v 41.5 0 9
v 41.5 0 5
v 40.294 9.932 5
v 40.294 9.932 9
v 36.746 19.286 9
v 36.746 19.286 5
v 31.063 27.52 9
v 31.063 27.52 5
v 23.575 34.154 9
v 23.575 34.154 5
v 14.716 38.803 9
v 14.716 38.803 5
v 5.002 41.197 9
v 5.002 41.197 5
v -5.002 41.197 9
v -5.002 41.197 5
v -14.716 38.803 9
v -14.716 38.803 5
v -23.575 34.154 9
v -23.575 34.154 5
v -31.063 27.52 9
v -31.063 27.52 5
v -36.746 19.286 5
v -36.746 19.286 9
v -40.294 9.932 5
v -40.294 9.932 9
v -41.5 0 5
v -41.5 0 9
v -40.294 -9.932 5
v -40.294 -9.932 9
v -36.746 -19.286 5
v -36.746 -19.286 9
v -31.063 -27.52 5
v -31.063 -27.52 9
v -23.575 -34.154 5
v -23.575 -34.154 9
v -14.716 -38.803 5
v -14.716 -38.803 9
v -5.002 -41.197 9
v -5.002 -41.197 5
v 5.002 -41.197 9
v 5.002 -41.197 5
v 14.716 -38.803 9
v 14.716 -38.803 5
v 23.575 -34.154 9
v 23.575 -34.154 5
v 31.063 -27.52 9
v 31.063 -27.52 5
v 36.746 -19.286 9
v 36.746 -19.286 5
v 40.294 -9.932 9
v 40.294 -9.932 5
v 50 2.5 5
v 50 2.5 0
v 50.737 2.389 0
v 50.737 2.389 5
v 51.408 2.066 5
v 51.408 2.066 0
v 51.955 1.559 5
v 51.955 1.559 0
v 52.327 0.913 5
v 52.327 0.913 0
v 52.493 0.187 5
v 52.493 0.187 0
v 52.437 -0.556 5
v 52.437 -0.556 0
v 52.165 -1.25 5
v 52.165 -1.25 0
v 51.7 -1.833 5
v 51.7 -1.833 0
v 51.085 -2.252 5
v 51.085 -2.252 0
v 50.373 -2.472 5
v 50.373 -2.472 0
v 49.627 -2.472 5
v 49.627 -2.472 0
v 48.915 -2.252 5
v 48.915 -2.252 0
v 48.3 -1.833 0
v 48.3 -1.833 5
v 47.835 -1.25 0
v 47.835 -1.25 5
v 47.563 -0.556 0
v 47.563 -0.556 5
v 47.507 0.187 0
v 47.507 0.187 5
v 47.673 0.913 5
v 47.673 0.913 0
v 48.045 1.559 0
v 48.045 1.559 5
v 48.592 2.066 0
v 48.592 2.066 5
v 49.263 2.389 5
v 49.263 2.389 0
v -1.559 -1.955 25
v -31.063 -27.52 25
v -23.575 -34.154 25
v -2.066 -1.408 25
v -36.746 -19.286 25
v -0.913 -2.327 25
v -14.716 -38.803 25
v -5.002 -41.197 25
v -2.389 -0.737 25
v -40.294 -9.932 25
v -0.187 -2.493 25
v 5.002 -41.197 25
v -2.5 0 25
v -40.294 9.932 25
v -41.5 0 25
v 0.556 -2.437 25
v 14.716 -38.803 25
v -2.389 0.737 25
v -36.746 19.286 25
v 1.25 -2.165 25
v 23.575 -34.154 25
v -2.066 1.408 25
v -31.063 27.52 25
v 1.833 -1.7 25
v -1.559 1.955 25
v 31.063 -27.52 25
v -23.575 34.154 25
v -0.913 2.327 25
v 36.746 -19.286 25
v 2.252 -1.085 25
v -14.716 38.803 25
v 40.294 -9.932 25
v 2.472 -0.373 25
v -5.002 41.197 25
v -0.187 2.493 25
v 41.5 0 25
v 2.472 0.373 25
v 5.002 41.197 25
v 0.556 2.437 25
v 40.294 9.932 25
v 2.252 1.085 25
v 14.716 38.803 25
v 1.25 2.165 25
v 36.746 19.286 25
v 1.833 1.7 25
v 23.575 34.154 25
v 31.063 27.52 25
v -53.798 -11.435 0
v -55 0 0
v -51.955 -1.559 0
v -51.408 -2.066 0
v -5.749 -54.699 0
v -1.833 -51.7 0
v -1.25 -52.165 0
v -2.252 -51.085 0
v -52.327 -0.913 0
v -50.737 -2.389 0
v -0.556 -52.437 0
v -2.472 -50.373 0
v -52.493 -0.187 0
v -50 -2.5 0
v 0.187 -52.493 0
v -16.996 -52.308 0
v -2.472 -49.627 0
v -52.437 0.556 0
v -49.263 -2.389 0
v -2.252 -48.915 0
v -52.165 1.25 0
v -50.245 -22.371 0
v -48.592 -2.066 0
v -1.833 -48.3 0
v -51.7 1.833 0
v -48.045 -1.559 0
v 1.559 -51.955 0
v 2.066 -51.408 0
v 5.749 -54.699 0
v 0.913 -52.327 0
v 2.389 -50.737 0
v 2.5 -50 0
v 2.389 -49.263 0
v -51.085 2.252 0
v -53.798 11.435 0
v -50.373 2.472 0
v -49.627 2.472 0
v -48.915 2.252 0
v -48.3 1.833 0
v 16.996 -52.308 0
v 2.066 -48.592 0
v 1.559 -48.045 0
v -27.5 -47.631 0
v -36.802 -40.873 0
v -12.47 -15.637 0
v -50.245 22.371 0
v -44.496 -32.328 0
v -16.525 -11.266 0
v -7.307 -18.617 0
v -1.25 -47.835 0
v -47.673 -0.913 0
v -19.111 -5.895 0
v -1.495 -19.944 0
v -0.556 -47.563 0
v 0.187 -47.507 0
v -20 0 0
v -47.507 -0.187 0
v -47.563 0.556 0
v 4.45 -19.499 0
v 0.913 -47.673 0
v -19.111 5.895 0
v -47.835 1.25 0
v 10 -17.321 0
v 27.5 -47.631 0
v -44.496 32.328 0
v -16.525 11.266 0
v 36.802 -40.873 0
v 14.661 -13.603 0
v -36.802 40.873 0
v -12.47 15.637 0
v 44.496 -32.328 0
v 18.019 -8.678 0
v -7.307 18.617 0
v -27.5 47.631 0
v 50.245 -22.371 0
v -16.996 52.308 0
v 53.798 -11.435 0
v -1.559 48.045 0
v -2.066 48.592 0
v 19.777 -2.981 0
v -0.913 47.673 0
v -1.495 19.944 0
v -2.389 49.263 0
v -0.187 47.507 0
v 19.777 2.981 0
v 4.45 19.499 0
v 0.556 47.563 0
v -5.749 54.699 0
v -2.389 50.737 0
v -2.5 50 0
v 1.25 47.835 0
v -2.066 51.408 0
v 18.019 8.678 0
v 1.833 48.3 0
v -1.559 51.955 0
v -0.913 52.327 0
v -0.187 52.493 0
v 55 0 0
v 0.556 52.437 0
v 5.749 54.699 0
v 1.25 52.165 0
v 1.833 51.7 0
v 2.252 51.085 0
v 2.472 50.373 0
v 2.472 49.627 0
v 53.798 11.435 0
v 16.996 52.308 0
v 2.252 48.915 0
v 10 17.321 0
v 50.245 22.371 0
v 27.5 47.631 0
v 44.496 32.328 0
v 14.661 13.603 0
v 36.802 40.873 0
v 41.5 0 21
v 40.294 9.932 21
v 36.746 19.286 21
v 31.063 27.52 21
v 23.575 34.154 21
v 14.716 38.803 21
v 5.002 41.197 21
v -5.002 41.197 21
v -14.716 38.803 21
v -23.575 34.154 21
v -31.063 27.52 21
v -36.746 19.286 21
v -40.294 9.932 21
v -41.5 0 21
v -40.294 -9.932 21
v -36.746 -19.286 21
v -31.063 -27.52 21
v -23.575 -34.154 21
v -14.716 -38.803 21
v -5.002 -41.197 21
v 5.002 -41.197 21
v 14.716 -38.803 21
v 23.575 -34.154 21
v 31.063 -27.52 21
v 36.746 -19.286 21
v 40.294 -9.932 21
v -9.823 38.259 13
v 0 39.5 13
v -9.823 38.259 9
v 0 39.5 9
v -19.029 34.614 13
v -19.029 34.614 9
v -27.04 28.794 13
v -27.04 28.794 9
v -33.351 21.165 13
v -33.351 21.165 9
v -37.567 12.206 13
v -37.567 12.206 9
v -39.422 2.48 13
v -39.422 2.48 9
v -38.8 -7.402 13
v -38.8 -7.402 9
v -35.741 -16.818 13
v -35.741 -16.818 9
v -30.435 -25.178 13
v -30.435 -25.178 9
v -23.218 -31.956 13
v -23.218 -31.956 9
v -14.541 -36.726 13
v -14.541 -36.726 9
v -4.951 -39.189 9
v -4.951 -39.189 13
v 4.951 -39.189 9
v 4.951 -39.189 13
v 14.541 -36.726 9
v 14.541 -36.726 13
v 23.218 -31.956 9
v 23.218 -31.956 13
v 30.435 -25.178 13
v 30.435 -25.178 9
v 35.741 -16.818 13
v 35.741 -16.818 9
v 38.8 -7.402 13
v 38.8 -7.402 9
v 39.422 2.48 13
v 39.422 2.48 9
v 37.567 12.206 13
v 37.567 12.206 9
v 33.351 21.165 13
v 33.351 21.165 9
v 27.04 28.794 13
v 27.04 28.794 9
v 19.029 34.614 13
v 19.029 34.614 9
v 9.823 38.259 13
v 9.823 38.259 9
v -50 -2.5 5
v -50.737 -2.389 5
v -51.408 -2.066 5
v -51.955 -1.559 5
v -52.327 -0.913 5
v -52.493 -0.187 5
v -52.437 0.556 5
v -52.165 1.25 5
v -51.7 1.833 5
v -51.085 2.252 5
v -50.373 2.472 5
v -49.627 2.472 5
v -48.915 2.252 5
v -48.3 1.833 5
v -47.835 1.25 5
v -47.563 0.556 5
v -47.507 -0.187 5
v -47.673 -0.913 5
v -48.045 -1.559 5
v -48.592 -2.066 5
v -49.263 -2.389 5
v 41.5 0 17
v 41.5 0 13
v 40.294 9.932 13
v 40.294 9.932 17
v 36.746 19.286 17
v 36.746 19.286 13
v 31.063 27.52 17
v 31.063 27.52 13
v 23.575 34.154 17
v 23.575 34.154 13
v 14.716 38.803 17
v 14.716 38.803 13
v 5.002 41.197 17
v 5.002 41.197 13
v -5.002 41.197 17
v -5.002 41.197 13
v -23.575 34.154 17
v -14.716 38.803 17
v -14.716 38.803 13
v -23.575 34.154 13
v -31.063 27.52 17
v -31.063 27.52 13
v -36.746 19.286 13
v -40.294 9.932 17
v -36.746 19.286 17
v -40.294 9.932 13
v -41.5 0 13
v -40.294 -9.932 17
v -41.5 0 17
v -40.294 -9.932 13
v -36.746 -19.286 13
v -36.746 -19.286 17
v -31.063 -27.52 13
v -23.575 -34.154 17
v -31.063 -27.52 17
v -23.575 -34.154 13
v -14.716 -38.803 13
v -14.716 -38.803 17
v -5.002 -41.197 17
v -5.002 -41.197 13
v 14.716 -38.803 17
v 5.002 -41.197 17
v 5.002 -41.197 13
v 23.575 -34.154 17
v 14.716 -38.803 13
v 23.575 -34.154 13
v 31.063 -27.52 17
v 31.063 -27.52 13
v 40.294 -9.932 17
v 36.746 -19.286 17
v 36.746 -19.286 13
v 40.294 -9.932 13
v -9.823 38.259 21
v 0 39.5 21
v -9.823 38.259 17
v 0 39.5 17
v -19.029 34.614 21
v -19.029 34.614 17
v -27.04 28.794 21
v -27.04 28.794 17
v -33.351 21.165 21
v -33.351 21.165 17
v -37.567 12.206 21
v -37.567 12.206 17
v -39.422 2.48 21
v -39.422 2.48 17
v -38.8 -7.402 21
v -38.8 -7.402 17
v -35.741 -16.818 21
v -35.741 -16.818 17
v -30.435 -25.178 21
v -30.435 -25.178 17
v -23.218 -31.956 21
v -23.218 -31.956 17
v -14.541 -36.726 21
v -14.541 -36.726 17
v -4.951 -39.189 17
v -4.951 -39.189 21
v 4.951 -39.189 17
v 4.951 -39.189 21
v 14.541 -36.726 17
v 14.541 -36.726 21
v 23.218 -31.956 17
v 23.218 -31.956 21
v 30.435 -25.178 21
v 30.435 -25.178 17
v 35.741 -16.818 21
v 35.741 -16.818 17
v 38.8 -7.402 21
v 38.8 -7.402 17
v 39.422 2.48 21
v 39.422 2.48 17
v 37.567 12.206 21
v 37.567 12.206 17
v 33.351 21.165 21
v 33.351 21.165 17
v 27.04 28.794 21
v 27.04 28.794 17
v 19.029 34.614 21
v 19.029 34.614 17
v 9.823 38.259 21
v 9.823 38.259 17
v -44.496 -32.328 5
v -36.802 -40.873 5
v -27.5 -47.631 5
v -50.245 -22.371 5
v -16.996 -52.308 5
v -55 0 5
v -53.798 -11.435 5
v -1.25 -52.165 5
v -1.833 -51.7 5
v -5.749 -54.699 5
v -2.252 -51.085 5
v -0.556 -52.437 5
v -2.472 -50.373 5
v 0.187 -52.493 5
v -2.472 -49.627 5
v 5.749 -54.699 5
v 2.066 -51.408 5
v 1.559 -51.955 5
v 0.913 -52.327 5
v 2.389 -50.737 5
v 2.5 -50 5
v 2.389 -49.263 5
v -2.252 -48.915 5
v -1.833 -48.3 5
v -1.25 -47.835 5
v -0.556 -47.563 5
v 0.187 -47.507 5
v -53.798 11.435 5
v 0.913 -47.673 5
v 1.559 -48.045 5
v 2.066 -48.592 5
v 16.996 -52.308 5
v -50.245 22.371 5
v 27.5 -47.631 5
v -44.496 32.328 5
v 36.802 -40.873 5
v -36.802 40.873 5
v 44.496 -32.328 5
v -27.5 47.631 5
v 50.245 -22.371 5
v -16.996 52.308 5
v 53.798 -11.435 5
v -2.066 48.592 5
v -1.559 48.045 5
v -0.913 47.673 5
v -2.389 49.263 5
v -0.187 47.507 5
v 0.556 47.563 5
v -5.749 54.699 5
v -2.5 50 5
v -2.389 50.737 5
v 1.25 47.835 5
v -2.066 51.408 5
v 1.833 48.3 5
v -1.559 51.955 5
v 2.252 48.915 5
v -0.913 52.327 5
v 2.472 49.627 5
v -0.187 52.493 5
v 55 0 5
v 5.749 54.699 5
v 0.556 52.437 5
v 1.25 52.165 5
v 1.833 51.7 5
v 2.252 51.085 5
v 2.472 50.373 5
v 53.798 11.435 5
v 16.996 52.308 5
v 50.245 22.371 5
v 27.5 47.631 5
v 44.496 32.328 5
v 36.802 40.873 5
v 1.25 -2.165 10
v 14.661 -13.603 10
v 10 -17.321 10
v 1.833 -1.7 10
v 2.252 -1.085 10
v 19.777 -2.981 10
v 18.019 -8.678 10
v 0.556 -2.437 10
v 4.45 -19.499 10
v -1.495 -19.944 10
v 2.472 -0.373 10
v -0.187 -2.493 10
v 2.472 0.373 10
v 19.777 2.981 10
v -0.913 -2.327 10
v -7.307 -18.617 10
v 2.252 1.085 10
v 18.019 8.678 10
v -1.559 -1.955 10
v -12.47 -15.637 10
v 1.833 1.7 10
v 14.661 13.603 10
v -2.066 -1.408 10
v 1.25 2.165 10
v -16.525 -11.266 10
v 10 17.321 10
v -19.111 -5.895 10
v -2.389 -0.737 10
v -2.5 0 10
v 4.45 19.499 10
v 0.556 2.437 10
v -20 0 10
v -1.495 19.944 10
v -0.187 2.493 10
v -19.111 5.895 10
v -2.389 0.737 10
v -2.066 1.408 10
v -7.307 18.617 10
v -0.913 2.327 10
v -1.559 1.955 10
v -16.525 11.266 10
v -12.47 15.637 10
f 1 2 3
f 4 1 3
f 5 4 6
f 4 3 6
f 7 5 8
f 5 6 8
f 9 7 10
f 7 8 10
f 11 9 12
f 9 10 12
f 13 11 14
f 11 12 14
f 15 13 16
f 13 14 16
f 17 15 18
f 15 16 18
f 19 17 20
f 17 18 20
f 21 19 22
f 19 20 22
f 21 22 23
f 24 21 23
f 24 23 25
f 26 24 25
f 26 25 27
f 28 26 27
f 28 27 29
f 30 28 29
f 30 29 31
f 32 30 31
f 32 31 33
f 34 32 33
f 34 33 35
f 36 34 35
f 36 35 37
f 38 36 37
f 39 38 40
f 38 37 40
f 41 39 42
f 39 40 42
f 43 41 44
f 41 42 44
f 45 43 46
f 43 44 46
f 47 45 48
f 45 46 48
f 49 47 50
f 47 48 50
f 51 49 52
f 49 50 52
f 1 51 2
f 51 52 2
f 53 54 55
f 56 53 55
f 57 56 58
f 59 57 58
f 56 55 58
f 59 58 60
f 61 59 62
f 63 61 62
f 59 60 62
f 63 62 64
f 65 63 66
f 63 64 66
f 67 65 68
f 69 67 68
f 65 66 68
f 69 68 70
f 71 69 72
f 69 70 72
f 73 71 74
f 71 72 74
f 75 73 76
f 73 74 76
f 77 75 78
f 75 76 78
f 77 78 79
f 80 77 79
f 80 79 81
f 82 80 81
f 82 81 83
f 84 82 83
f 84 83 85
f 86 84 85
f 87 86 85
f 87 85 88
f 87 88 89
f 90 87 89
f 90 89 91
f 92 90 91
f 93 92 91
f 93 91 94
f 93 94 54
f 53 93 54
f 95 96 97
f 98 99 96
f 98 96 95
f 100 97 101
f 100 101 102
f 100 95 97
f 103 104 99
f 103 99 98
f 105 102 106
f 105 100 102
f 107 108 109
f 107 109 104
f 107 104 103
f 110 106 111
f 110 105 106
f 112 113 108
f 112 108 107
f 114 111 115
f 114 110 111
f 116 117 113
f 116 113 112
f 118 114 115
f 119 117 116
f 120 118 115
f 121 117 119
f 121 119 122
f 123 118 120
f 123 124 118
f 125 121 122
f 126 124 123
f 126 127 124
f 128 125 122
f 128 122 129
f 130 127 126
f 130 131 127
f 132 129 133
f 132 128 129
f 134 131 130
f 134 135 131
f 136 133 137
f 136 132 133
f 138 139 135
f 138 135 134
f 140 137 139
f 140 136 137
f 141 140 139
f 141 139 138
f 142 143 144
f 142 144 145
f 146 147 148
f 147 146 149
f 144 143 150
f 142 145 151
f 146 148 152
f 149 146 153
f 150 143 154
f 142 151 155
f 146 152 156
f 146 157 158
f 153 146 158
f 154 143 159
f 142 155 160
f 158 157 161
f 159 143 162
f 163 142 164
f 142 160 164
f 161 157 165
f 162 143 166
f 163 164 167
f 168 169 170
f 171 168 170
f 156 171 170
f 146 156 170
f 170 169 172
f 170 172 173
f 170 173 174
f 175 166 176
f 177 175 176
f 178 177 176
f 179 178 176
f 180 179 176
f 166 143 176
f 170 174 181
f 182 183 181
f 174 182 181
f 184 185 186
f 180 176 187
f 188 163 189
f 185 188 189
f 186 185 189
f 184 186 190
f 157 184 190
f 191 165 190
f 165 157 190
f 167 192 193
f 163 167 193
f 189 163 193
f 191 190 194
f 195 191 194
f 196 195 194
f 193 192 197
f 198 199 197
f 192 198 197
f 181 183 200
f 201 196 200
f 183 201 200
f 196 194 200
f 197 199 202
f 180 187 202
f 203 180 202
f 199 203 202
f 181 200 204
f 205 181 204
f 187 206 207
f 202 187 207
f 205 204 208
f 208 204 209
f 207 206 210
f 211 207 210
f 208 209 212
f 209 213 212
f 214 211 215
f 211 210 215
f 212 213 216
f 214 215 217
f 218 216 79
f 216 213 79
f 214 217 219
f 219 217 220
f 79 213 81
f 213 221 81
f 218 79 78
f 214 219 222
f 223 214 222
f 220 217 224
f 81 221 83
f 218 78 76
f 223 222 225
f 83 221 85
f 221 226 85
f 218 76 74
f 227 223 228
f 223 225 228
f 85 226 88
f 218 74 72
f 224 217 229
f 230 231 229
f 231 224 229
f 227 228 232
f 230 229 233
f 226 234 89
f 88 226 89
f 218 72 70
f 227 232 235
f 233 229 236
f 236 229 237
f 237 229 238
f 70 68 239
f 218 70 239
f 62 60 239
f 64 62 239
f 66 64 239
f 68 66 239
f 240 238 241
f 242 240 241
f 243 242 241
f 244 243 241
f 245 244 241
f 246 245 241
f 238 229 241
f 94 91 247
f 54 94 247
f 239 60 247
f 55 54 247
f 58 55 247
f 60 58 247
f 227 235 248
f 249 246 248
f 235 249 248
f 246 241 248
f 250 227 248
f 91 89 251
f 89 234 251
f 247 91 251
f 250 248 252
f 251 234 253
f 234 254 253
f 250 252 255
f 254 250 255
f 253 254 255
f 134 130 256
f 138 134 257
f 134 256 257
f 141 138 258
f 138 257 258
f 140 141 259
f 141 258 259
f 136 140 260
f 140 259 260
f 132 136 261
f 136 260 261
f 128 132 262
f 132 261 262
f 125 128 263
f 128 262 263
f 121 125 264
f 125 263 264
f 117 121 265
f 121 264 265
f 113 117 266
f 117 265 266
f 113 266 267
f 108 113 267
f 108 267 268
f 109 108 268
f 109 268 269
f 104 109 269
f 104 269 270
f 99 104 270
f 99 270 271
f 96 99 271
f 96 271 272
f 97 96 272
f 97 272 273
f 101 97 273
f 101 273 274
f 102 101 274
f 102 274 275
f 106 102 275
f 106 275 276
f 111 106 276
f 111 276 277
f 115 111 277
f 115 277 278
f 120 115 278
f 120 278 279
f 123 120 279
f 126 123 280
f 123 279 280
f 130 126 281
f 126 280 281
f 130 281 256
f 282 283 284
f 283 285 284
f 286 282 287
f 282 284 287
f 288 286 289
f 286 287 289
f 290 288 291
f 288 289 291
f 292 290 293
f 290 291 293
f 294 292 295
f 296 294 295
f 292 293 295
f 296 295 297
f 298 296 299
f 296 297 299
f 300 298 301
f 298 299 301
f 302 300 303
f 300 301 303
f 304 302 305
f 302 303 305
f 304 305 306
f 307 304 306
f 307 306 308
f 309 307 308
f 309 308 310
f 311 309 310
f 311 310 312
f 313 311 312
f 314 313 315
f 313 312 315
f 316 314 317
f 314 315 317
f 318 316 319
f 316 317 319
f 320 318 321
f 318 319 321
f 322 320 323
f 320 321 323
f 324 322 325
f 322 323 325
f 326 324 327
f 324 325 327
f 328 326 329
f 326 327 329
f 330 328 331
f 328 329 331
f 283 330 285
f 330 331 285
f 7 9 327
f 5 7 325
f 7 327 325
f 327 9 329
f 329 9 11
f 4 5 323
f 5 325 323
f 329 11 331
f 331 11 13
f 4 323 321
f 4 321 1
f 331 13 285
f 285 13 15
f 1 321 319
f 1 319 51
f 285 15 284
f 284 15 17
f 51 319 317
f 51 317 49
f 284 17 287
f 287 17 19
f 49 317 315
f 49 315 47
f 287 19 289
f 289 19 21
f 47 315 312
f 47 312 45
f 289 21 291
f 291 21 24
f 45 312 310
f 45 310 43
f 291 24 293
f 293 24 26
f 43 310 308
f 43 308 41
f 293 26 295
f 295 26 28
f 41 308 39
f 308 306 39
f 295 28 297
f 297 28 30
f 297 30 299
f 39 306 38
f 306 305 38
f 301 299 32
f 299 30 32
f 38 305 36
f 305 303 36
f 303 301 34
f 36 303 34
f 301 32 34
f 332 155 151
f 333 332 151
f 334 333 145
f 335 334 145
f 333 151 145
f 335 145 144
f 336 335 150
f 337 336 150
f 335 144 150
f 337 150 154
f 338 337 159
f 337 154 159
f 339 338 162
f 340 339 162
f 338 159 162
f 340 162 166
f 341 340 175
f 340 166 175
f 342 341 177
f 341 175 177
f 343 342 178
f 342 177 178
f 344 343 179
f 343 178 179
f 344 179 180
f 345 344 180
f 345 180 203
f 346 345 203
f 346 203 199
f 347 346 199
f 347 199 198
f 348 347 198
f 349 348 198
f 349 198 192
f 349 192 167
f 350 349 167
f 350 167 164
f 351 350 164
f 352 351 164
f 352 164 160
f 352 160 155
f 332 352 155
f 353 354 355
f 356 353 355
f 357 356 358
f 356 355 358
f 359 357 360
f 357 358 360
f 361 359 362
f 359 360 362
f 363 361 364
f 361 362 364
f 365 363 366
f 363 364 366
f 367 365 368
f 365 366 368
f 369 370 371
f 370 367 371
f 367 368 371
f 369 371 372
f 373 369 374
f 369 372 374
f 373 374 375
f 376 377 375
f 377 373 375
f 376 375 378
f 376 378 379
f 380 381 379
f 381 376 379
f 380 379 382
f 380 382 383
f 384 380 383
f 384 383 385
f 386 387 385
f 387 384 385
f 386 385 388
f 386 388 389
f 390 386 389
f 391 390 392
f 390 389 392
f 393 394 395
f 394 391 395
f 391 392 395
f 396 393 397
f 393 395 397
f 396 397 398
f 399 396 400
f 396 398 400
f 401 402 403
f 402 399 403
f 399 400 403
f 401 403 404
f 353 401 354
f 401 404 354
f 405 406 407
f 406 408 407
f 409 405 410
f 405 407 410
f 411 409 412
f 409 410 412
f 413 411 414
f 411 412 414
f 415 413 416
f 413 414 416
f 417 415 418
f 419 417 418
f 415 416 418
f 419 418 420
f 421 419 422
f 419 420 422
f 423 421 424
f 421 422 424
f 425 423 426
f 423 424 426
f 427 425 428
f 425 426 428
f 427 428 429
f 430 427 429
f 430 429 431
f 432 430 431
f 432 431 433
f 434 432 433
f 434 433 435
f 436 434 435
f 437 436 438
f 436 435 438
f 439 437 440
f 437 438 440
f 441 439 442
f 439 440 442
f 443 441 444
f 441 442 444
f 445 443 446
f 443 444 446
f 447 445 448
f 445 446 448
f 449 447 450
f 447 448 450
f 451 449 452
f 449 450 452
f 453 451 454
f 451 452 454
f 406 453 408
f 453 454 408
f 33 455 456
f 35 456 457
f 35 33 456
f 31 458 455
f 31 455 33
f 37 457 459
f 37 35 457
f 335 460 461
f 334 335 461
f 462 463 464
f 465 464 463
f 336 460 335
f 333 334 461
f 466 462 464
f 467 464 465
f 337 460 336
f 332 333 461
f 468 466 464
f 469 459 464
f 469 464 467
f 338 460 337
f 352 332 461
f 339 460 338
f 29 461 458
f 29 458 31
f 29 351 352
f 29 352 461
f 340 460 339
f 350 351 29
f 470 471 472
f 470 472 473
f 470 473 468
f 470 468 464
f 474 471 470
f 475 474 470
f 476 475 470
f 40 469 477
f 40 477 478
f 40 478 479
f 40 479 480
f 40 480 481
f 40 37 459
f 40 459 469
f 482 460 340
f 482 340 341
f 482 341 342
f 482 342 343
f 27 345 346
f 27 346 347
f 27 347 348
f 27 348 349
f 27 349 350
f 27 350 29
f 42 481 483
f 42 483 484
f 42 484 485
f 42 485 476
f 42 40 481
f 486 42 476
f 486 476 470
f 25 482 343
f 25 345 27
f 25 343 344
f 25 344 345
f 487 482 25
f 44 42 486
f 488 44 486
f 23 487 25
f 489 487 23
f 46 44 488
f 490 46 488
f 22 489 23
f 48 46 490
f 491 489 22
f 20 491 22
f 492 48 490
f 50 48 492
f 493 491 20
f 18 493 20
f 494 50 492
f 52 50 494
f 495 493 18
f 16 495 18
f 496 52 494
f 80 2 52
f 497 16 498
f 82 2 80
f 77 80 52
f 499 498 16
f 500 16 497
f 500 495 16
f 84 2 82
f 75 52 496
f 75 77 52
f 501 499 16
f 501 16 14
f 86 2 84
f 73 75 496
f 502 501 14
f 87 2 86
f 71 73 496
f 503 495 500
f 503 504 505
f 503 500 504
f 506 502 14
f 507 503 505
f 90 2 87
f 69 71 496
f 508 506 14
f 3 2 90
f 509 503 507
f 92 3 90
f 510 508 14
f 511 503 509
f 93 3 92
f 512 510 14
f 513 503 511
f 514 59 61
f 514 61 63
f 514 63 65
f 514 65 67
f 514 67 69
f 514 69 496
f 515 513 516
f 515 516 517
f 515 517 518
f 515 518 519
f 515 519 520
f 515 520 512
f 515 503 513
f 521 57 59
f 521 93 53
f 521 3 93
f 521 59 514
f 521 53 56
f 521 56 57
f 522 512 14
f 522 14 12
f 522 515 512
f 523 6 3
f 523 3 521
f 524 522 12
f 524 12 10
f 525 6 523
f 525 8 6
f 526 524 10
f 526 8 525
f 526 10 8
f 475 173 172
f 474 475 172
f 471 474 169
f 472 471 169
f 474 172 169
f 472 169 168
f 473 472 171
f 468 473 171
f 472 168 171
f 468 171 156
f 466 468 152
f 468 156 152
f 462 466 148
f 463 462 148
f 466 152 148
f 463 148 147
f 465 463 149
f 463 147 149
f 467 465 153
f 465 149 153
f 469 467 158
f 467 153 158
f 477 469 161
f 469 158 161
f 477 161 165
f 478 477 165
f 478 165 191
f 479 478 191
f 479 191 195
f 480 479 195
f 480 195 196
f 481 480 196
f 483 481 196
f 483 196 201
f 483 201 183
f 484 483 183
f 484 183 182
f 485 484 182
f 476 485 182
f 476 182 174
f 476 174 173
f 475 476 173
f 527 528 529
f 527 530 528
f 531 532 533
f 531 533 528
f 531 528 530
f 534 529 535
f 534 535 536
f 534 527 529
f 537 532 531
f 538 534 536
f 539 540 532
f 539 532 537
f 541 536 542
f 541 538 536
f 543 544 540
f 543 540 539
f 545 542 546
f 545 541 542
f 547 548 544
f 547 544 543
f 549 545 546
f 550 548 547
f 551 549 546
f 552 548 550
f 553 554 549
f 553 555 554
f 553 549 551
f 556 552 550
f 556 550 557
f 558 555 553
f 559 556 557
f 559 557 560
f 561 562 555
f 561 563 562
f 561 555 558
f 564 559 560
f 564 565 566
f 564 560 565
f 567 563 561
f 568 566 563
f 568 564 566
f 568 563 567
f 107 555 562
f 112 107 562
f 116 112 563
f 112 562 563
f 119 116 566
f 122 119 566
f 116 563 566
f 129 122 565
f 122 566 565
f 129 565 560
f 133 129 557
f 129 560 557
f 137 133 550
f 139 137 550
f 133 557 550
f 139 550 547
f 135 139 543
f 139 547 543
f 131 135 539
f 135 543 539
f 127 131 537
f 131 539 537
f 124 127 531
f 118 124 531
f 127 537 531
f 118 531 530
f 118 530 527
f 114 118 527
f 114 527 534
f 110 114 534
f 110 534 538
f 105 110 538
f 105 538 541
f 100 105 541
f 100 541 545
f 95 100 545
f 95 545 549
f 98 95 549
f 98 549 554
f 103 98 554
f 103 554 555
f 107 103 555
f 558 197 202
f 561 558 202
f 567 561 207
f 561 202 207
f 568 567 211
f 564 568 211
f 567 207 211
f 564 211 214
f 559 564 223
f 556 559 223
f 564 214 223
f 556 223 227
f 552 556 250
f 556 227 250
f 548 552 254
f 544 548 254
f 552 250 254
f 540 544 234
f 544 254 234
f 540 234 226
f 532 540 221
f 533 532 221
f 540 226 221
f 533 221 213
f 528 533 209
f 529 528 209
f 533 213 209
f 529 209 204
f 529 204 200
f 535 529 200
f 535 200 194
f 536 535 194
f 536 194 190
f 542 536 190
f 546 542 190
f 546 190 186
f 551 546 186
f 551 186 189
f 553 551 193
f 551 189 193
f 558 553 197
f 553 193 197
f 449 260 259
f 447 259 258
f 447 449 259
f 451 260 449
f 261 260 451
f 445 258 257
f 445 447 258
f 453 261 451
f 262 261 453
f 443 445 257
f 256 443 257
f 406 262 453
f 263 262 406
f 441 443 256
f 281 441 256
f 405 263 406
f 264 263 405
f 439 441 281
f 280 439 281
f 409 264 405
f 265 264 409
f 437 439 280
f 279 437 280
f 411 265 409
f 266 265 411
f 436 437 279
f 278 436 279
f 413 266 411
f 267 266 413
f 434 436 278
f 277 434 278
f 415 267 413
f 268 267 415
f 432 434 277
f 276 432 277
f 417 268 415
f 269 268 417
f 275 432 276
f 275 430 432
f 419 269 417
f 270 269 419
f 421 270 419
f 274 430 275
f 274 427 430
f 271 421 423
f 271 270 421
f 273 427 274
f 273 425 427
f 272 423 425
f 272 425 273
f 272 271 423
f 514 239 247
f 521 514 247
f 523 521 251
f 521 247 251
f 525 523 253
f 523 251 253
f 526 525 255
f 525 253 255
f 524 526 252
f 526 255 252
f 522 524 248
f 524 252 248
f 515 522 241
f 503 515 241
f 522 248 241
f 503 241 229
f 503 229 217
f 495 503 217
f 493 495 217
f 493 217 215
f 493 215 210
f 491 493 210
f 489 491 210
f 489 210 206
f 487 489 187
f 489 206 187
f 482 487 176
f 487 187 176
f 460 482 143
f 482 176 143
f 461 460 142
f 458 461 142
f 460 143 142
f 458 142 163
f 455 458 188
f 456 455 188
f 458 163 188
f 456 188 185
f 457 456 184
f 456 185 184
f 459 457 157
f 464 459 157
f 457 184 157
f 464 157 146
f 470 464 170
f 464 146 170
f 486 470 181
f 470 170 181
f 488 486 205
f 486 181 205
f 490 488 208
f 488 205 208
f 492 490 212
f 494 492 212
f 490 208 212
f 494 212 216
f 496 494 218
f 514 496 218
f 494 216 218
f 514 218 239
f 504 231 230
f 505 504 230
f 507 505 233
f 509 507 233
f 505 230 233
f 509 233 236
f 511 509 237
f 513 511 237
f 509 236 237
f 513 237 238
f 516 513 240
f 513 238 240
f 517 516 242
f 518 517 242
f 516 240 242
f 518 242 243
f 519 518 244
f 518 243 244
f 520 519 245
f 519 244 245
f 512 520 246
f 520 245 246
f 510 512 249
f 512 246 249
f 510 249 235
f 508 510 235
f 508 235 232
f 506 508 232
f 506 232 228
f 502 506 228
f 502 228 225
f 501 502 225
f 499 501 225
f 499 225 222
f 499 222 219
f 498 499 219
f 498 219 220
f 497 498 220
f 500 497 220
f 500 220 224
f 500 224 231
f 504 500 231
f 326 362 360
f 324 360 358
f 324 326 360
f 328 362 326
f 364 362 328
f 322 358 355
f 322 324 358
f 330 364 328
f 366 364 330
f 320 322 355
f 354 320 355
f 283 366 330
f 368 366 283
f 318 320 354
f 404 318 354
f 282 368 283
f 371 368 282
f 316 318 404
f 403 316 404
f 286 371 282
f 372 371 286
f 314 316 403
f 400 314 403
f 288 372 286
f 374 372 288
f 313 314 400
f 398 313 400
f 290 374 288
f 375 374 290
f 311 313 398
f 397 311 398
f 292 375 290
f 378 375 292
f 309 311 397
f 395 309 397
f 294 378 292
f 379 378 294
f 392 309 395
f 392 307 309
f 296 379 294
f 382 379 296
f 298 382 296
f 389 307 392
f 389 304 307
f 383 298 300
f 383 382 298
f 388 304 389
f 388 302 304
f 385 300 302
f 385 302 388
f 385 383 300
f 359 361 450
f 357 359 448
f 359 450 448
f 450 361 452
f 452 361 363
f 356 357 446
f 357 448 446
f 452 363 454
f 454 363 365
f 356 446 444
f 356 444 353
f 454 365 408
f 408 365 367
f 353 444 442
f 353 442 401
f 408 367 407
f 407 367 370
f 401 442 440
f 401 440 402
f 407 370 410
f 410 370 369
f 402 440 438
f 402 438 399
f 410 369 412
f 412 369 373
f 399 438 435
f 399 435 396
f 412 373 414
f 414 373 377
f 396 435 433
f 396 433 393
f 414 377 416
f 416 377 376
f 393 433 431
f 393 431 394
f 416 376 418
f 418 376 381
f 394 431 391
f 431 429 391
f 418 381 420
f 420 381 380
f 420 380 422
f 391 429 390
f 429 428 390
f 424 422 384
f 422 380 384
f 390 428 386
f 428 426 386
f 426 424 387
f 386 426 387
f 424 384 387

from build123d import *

# Parameters (mm, degrees)
SKETCH1_R           = 55
BOSS_EXTRUDE1_DEPTH = 5
SKETCH3_R           = 2.5
CUT_EXTRUDE1_DEPTH  = 78.942286341
CIRPATTERN1_COUNT   = 4
SKETCH2_R           = 41.5
BOSS_EXTRUDE2_DEPTH = 20
SKETCH4_W           = 4
SKETCH4_H           = 2
SKETCH5_R           = 2.5
CUT_EXTRUDE2_DEPTH  = 82.700673192
SKETCH6_R           = 20
CUT_EXTRUDE3_DEPTH  = 10


with BuildPart() as part:
    # Sketch1 → Boss-Extrude1 (new body)
    with BuildSketch(Plane.XY):
        Circle(SKETCH1_R)
    extrude(amount=BOSS_EXTRUDE1_DEPTH)

    # Sketch3 → Cut-Extrude1 (cut, through all)
    with BuildSketch(Plane(origin=(0, 0, 0), x_dir=(-1, 0, 0), z_dir=(0, 0, -1))):
        with Locations((0, 50)):
            Circle(SKETCH3_R)
    cut_extrude1 = extrude(amount=-CUT_EXTRUDE1_DEPTH, mode=Mode.SUBTRACT)

    # CirPattern1: Cut-Extrude1 ×4 about axis
    cirpattern1_axis = Axis((0, 0, 0), (0, 0, 1))
    for i in range(1, CIRPATTERN1_COUNT):
        add(cut_extrude1.rotate(cirpattern1_axis, i * 360 / CIRPATTERN1_COUNT), mode=Mode.SUBTRACT)

    # Sketch2 → Boss-Extrude2 (add)
    with BuildSketch(Plane.XY.offset(5)):
        Circle(SKETCH2_R)
    extrude(amount=BOSS_EXTRUDE2_DEPTH)

    # Sketch4 → Cut-Revolve1 (revolve, cut)
    with BuildSketch(Plane(origin=(0, 0, 0), x_dir=(0, 0, -1), z_dir=(1, 0, 0))):
        with Locations((-11, 40.5)):
            Rectangle(SKETCH4_W, SKETCH4_H)
        with Locations((-19, 40.5)):
            Rectangle(SKETCH4_W, SKETCH4_H)
    revolve(axis=Axis((0, 0, 0), (0, 0, 1)), mode=Mode.SUBTRACT)

    # Sketch5 → Cut-Extrude2 (cut, through all)
    with BuildSketch(Plane(origin=(0, 0, 0), x_dir=(-1, 0, 0), z_dir=(0, 0, -1))):
        Circle(SKETCH5_R)
    extrude(amount=-CUT_EXTRUDE2_DEPTH, mode=Mode.SUBTRACT)

    # Sketch6 → Cut-Extrude3 (cut)
    with BuildSketch(Plane(origin=(0, 0, 0), x_dir=(-1, 0, 0), z_dir=(0, 0, -1))):
        Circle(SKETCH6_R)
    extrude(amount=-CUT_EXTRUDE3_DEPTH, mode=Mode.SUBTRACT)


solid = part.part
